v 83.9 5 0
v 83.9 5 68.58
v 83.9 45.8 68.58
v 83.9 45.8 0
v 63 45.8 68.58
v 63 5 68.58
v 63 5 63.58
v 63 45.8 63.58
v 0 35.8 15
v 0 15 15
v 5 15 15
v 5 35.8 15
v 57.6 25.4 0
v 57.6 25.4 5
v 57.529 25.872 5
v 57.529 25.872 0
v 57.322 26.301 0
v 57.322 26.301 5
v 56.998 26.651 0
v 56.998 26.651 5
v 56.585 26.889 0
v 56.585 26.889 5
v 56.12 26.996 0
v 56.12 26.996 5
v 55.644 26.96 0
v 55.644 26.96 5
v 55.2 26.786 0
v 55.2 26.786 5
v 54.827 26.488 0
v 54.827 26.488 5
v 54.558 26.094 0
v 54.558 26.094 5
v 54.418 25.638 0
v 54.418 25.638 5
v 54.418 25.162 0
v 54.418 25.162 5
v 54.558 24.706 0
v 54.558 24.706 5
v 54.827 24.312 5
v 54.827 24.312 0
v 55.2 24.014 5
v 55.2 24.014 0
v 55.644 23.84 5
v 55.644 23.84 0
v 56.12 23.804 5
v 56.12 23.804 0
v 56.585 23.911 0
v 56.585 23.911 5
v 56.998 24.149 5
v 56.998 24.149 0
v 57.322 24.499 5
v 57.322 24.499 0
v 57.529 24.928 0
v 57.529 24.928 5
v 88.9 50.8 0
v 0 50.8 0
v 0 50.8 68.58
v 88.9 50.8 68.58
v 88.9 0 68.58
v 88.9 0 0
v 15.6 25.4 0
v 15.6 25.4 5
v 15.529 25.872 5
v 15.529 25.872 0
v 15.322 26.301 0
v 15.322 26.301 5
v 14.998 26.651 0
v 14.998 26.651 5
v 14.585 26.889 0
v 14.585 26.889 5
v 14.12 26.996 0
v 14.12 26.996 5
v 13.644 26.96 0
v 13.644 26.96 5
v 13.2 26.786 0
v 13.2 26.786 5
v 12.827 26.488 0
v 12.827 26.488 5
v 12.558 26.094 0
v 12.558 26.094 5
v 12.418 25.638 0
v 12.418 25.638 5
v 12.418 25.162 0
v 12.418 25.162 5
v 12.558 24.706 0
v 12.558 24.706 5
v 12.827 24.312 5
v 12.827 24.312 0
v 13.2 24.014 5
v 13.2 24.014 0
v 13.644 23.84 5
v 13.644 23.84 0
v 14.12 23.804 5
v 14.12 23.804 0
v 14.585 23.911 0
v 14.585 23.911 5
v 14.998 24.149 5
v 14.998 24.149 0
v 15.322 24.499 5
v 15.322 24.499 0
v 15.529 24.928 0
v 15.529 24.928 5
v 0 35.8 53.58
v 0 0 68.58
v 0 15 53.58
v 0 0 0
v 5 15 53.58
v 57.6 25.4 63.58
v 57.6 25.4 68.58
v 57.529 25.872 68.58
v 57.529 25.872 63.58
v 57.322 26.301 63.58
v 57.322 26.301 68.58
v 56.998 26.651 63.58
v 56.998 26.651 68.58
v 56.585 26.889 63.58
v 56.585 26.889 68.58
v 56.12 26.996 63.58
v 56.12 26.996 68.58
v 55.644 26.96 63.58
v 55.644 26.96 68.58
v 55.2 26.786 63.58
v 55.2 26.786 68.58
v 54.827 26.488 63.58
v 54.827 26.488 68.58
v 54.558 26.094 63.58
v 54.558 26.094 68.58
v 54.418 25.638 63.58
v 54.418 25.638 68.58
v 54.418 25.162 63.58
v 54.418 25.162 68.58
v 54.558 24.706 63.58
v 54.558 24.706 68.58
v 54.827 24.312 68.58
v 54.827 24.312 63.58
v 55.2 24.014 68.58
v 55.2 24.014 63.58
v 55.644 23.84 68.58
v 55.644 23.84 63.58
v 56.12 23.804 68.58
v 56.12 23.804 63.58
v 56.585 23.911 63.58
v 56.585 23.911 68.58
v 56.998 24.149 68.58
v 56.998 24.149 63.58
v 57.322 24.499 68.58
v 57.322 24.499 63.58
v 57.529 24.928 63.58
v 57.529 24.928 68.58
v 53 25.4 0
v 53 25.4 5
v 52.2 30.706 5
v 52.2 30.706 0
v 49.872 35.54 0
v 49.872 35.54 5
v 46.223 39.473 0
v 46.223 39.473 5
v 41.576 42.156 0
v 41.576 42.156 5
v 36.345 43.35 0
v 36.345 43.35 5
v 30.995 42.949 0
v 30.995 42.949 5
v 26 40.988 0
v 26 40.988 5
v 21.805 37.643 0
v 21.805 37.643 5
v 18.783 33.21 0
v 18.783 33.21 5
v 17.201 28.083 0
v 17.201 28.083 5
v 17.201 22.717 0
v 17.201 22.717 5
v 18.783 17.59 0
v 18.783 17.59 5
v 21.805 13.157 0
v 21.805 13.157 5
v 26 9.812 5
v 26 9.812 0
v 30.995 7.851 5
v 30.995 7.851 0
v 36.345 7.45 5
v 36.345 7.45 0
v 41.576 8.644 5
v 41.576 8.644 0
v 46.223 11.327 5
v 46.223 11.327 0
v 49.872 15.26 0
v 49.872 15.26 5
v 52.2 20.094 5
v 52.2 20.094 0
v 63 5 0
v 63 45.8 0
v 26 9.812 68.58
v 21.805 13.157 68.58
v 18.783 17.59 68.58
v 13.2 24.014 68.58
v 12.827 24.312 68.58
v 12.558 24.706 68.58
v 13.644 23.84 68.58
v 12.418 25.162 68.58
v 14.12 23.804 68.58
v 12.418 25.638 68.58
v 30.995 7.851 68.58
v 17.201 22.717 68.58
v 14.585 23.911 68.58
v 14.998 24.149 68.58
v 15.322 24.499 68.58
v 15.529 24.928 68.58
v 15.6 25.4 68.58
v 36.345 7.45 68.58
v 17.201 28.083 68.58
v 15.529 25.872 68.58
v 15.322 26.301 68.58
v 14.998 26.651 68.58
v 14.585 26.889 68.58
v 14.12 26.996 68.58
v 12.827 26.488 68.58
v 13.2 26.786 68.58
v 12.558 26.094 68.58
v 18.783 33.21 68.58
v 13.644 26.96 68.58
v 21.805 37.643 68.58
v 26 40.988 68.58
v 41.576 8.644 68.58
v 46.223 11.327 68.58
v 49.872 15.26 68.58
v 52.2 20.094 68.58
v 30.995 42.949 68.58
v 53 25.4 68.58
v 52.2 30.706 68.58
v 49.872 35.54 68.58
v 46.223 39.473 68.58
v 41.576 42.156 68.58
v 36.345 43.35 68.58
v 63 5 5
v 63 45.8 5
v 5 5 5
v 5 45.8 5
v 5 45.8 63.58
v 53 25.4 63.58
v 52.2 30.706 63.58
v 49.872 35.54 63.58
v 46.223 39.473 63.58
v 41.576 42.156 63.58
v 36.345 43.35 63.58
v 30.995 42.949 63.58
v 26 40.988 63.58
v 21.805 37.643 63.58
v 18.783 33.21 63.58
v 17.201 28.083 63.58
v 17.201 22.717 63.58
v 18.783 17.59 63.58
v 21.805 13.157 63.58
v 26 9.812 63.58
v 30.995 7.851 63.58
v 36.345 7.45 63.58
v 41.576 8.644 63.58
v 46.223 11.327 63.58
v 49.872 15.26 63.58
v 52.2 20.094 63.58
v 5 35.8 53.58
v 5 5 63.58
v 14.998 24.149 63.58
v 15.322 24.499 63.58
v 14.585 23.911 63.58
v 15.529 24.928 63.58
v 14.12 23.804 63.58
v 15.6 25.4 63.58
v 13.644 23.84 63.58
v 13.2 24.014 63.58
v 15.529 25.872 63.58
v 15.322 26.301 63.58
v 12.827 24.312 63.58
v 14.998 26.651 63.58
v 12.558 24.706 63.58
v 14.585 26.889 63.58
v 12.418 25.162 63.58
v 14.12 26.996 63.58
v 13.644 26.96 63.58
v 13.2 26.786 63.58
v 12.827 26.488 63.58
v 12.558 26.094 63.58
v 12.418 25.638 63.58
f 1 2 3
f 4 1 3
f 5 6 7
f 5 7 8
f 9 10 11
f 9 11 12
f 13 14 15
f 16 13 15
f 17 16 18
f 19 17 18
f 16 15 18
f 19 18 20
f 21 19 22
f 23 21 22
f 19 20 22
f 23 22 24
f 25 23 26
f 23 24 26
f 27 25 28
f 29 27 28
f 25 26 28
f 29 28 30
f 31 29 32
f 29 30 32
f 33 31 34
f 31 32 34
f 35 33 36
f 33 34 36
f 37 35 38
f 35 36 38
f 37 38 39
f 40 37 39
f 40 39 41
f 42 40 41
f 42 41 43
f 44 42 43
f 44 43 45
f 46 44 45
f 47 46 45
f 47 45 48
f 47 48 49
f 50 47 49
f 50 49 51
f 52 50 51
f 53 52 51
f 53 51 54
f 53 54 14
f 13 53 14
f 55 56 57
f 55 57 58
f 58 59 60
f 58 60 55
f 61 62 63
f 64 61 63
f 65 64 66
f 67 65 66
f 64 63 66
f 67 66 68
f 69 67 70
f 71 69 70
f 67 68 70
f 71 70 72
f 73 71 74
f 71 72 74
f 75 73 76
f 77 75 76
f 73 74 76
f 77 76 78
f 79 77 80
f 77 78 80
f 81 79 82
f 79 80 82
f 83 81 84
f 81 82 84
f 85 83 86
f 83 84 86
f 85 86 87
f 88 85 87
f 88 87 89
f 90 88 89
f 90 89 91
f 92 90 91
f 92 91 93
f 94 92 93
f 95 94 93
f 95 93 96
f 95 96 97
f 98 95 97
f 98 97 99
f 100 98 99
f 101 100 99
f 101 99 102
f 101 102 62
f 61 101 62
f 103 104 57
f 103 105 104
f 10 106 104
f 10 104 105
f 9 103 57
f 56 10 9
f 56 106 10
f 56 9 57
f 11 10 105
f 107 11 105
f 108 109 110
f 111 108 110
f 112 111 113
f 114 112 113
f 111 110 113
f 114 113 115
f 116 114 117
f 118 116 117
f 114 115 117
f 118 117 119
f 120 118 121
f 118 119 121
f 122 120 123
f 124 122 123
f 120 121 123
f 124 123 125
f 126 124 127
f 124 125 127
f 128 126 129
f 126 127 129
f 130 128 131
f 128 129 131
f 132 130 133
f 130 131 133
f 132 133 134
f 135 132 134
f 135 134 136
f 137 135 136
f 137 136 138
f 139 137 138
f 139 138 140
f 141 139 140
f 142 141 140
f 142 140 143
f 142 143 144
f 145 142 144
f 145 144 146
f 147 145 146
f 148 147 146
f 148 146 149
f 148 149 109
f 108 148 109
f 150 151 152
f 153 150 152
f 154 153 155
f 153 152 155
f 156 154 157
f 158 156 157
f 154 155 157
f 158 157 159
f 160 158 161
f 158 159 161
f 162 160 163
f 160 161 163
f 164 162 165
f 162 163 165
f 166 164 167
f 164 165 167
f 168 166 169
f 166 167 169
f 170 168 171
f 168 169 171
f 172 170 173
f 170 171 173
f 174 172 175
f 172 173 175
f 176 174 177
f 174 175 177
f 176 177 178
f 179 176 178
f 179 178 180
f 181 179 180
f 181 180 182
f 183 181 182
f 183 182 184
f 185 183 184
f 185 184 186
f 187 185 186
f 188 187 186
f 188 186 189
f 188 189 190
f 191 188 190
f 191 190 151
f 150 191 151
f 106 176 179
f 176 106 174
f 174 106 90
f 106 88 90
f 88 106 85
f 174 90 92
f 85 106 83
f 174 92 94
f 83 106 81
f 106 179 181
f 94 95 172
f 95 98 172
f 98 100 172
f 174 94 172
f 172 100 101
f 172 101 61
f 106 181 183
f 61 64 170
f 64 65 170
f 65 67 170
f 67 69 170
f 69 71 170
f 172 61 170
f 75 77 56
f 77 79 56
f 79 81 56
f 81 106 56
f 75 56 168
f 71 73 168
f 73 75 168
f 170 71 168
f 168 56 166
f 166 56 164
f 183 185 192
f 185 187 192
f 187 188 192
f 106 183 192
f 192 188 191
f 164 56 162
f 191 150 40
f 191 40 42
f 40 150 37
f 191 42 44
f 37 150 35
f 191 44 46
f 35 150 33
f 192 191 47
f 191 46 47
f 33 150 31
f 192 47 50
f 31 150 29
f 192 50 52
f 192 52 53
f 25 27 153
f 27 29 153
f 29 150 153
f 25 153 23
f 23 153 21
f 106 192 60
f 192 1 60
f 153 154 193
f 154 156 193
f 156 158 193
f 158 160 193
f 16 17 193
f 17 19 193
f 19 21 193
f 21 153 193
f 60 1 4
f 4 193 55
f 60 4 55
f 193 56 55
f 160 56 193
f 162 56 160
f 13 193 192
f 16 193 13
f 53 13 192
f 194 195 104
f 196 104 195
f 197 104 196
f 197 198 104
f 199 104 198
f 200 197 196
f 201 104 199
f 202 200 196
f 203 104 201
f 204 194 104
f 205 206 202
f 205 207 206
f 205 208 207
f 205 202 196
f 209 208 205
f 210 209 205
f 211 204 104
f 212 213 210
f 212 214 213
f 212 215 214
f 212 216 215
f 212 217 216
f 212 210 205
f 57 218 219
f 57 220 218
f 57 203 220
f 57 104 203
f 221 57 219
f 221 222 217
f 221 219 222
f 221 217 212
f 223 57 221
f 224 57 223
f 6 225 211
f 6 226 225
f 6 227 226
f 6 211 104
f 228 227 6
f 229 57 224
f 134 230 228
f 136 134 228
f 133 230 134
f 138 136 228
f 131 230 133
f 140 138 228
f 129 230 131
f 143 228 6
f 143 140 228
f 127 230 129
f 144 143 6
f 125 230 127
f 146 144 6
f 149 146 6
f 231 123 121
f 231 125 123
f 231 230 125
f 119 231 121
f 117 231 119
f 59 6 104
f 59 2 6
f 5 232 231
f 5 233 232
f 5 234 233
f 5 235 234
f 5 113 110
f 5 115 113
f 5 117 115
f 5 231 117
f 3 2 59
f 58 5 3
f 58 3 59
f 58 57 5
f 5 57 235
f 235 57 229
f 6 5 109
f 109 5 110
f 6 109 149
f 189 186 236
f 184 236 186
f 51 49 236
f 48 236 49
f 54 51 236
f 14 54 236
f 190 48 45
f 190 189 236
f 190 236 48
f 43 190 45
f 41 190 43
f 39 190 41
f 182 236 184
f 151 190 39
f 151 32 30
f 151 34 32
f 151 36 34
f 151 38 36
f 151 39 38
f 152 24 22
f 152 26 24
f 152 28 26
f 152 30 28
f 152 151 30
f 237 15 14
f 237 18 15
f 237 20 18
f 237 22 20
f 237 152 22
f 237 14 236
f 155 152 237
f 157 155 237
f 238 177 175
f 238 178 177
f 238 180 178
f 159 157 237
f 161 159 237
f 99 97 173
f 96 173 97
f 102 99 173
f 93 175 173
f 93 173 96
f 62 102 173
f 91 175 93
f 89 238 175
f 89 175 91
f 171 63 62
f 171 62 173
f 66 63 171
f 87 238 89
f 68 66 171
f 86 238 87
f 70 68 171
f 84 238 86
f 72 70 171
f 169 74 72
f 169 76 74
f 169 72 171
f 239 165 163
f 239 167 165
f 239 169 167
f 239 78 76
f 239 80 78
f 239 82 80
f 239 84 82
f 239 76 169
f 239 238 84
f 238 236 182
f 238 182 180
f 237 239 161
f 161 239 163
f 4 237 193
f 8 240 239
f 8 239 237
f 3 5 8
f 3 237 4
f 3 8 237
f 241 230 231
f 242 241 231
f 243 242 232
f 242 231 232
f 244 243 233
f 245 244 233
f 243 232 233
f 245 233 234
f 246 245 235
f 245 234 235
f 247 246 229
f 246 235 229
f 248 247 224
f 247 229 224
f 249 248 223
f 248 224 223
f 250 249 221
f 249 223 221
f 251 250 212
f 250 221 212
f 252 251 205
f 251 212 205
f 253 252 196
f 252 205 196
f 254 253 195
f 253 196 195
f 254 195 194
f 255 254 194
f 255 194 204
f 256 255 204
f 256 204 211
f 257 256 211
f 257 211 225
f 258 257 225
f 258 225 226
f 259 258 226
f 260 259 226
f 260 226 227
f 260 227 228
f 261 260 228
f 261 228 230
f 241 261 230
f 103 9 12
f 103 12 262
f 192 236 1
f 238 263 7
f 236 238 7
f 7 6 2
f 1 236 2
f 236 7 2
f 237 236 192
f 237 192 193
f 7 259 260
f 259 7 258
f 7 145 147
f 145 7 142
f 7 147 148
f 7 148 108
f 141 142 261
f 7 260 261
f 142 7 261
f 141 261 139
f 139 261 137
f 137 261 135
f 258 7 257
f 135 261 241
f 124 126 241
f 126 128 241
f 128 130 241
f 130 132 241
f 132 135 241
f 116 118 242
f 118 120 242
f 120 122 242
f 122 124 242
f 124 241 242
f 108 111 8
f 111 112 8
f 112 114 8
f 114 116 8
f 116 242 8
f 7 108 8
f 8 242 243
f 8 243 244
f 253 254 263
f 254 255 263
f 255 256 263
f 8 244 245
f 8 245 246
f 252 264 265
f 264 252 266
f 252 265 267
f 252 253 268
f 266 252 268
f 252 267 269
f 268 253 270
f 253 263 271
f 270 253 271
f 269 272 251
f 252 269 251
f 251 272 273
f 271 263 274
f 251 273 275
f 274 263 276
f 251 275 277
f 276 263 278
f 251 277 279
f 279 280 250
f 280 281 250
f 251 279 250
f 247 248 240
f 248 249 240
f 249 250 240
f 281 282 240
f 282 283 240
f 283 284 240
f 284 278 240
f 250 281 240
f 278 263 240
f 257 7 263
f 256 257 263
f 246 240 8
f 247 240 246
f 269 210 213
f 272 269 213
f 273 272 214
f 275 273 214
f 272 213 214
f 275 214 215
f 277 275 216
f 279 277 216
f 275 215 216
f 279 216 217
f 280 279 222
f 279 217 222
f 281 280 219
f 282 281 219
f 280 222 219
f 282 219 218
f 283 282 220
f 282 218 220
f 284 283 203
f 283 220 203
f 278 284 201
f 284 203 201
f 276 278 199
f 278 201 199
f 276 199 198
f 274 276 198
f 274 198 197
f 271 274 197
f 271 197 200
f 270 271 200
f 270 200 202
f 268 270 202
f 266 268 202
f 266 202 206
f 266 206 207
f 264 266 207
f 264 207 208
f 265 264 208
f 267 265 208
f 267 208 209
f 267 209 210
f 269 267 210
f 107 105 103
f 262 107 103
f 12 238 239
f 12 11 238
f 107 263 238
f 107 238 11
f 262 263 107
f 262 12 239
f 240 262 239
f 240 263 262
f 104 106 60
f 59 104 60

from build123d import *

# Parameters (mm, degrees)
SKETCH1_W           = 88.9
SKETCH1_H           = 50.8
BOSS_EXTRUDE1_DEPTH = 68.58
SHELL5_START        = 5
SHELL5_OUTLINE_W    = 40.8
SHELL5_OUTLINE_H    = 58.58
SHELL5_DEPTH        = 78.9
SKETCH2_R           = 18
SKETCH2_R_2         = 1.6
SKETCH2_W           = 20.9
SKETCH2_H           = 40.8
CUT_EXTRUDE2_DEPTH  = 68.58
SKETCH7_W           = 38.58
SKETCH7_H           = 20.8
CUT_EXTRUDE6_DEPTH  = 10


# Read off the part's stored shape, not the designer's step: Shell5
with BuildPart() as part:
    # Sketch1 → Boss-Extrude1 (new body)
    with BuildSketch(Plane.XY):
        with Locations((44.45, 25.4)):
            Rectangle(SKETCH1_W, SKETCH1_H)
    extrude(amount=BOSS_EXTRUDE1_DEPTH)

    # Shell5 outline → Shell5 (cut)
    with BuildSketch(Plane.YZ.offset(SHELL5_START)):
        with Locations((25.4, 34.29)):
            Rectangle(SHELL5_OUTLINE_W, SHELL5_OUTLINE_H)
    extrude(amount=SHELL5_DEPTH, mode=Mode.SUBTRACT)

    # Sketch2 → Cut-Extrude2 (cut)
    with BuildSketch(Plane.XY.offset(68.58)):
        with Locations((35, 25.4)):
            Circle(SKETCH2_R)
        with Locations((14, 25.4)):
            Circle(SKETCH2_R_2)
        with Locations((56, 25.4)):
            Circle(SKETCH2_R_2)
        with Locations((73.45, 25.4)):
            Rectangle(SKETCH2_W, SKETCH2_H)
    extrude(amount=-CUT_EXTRUDE2_DEPTH, mode=Mode.SUBTRACT)

    # Sketch7 → Cut-Extrude6 (cut)
    with BuildSketch(Plane.ZY):
        with Locations((34.29, 25.4)):
            Rectangle(SKETCH7_W, SKETCH7_H)
    extrude(amount=-CUT_EXTRUDE6_DEPTH, mode=Mode.SUBTRACT)


solid = part.part
